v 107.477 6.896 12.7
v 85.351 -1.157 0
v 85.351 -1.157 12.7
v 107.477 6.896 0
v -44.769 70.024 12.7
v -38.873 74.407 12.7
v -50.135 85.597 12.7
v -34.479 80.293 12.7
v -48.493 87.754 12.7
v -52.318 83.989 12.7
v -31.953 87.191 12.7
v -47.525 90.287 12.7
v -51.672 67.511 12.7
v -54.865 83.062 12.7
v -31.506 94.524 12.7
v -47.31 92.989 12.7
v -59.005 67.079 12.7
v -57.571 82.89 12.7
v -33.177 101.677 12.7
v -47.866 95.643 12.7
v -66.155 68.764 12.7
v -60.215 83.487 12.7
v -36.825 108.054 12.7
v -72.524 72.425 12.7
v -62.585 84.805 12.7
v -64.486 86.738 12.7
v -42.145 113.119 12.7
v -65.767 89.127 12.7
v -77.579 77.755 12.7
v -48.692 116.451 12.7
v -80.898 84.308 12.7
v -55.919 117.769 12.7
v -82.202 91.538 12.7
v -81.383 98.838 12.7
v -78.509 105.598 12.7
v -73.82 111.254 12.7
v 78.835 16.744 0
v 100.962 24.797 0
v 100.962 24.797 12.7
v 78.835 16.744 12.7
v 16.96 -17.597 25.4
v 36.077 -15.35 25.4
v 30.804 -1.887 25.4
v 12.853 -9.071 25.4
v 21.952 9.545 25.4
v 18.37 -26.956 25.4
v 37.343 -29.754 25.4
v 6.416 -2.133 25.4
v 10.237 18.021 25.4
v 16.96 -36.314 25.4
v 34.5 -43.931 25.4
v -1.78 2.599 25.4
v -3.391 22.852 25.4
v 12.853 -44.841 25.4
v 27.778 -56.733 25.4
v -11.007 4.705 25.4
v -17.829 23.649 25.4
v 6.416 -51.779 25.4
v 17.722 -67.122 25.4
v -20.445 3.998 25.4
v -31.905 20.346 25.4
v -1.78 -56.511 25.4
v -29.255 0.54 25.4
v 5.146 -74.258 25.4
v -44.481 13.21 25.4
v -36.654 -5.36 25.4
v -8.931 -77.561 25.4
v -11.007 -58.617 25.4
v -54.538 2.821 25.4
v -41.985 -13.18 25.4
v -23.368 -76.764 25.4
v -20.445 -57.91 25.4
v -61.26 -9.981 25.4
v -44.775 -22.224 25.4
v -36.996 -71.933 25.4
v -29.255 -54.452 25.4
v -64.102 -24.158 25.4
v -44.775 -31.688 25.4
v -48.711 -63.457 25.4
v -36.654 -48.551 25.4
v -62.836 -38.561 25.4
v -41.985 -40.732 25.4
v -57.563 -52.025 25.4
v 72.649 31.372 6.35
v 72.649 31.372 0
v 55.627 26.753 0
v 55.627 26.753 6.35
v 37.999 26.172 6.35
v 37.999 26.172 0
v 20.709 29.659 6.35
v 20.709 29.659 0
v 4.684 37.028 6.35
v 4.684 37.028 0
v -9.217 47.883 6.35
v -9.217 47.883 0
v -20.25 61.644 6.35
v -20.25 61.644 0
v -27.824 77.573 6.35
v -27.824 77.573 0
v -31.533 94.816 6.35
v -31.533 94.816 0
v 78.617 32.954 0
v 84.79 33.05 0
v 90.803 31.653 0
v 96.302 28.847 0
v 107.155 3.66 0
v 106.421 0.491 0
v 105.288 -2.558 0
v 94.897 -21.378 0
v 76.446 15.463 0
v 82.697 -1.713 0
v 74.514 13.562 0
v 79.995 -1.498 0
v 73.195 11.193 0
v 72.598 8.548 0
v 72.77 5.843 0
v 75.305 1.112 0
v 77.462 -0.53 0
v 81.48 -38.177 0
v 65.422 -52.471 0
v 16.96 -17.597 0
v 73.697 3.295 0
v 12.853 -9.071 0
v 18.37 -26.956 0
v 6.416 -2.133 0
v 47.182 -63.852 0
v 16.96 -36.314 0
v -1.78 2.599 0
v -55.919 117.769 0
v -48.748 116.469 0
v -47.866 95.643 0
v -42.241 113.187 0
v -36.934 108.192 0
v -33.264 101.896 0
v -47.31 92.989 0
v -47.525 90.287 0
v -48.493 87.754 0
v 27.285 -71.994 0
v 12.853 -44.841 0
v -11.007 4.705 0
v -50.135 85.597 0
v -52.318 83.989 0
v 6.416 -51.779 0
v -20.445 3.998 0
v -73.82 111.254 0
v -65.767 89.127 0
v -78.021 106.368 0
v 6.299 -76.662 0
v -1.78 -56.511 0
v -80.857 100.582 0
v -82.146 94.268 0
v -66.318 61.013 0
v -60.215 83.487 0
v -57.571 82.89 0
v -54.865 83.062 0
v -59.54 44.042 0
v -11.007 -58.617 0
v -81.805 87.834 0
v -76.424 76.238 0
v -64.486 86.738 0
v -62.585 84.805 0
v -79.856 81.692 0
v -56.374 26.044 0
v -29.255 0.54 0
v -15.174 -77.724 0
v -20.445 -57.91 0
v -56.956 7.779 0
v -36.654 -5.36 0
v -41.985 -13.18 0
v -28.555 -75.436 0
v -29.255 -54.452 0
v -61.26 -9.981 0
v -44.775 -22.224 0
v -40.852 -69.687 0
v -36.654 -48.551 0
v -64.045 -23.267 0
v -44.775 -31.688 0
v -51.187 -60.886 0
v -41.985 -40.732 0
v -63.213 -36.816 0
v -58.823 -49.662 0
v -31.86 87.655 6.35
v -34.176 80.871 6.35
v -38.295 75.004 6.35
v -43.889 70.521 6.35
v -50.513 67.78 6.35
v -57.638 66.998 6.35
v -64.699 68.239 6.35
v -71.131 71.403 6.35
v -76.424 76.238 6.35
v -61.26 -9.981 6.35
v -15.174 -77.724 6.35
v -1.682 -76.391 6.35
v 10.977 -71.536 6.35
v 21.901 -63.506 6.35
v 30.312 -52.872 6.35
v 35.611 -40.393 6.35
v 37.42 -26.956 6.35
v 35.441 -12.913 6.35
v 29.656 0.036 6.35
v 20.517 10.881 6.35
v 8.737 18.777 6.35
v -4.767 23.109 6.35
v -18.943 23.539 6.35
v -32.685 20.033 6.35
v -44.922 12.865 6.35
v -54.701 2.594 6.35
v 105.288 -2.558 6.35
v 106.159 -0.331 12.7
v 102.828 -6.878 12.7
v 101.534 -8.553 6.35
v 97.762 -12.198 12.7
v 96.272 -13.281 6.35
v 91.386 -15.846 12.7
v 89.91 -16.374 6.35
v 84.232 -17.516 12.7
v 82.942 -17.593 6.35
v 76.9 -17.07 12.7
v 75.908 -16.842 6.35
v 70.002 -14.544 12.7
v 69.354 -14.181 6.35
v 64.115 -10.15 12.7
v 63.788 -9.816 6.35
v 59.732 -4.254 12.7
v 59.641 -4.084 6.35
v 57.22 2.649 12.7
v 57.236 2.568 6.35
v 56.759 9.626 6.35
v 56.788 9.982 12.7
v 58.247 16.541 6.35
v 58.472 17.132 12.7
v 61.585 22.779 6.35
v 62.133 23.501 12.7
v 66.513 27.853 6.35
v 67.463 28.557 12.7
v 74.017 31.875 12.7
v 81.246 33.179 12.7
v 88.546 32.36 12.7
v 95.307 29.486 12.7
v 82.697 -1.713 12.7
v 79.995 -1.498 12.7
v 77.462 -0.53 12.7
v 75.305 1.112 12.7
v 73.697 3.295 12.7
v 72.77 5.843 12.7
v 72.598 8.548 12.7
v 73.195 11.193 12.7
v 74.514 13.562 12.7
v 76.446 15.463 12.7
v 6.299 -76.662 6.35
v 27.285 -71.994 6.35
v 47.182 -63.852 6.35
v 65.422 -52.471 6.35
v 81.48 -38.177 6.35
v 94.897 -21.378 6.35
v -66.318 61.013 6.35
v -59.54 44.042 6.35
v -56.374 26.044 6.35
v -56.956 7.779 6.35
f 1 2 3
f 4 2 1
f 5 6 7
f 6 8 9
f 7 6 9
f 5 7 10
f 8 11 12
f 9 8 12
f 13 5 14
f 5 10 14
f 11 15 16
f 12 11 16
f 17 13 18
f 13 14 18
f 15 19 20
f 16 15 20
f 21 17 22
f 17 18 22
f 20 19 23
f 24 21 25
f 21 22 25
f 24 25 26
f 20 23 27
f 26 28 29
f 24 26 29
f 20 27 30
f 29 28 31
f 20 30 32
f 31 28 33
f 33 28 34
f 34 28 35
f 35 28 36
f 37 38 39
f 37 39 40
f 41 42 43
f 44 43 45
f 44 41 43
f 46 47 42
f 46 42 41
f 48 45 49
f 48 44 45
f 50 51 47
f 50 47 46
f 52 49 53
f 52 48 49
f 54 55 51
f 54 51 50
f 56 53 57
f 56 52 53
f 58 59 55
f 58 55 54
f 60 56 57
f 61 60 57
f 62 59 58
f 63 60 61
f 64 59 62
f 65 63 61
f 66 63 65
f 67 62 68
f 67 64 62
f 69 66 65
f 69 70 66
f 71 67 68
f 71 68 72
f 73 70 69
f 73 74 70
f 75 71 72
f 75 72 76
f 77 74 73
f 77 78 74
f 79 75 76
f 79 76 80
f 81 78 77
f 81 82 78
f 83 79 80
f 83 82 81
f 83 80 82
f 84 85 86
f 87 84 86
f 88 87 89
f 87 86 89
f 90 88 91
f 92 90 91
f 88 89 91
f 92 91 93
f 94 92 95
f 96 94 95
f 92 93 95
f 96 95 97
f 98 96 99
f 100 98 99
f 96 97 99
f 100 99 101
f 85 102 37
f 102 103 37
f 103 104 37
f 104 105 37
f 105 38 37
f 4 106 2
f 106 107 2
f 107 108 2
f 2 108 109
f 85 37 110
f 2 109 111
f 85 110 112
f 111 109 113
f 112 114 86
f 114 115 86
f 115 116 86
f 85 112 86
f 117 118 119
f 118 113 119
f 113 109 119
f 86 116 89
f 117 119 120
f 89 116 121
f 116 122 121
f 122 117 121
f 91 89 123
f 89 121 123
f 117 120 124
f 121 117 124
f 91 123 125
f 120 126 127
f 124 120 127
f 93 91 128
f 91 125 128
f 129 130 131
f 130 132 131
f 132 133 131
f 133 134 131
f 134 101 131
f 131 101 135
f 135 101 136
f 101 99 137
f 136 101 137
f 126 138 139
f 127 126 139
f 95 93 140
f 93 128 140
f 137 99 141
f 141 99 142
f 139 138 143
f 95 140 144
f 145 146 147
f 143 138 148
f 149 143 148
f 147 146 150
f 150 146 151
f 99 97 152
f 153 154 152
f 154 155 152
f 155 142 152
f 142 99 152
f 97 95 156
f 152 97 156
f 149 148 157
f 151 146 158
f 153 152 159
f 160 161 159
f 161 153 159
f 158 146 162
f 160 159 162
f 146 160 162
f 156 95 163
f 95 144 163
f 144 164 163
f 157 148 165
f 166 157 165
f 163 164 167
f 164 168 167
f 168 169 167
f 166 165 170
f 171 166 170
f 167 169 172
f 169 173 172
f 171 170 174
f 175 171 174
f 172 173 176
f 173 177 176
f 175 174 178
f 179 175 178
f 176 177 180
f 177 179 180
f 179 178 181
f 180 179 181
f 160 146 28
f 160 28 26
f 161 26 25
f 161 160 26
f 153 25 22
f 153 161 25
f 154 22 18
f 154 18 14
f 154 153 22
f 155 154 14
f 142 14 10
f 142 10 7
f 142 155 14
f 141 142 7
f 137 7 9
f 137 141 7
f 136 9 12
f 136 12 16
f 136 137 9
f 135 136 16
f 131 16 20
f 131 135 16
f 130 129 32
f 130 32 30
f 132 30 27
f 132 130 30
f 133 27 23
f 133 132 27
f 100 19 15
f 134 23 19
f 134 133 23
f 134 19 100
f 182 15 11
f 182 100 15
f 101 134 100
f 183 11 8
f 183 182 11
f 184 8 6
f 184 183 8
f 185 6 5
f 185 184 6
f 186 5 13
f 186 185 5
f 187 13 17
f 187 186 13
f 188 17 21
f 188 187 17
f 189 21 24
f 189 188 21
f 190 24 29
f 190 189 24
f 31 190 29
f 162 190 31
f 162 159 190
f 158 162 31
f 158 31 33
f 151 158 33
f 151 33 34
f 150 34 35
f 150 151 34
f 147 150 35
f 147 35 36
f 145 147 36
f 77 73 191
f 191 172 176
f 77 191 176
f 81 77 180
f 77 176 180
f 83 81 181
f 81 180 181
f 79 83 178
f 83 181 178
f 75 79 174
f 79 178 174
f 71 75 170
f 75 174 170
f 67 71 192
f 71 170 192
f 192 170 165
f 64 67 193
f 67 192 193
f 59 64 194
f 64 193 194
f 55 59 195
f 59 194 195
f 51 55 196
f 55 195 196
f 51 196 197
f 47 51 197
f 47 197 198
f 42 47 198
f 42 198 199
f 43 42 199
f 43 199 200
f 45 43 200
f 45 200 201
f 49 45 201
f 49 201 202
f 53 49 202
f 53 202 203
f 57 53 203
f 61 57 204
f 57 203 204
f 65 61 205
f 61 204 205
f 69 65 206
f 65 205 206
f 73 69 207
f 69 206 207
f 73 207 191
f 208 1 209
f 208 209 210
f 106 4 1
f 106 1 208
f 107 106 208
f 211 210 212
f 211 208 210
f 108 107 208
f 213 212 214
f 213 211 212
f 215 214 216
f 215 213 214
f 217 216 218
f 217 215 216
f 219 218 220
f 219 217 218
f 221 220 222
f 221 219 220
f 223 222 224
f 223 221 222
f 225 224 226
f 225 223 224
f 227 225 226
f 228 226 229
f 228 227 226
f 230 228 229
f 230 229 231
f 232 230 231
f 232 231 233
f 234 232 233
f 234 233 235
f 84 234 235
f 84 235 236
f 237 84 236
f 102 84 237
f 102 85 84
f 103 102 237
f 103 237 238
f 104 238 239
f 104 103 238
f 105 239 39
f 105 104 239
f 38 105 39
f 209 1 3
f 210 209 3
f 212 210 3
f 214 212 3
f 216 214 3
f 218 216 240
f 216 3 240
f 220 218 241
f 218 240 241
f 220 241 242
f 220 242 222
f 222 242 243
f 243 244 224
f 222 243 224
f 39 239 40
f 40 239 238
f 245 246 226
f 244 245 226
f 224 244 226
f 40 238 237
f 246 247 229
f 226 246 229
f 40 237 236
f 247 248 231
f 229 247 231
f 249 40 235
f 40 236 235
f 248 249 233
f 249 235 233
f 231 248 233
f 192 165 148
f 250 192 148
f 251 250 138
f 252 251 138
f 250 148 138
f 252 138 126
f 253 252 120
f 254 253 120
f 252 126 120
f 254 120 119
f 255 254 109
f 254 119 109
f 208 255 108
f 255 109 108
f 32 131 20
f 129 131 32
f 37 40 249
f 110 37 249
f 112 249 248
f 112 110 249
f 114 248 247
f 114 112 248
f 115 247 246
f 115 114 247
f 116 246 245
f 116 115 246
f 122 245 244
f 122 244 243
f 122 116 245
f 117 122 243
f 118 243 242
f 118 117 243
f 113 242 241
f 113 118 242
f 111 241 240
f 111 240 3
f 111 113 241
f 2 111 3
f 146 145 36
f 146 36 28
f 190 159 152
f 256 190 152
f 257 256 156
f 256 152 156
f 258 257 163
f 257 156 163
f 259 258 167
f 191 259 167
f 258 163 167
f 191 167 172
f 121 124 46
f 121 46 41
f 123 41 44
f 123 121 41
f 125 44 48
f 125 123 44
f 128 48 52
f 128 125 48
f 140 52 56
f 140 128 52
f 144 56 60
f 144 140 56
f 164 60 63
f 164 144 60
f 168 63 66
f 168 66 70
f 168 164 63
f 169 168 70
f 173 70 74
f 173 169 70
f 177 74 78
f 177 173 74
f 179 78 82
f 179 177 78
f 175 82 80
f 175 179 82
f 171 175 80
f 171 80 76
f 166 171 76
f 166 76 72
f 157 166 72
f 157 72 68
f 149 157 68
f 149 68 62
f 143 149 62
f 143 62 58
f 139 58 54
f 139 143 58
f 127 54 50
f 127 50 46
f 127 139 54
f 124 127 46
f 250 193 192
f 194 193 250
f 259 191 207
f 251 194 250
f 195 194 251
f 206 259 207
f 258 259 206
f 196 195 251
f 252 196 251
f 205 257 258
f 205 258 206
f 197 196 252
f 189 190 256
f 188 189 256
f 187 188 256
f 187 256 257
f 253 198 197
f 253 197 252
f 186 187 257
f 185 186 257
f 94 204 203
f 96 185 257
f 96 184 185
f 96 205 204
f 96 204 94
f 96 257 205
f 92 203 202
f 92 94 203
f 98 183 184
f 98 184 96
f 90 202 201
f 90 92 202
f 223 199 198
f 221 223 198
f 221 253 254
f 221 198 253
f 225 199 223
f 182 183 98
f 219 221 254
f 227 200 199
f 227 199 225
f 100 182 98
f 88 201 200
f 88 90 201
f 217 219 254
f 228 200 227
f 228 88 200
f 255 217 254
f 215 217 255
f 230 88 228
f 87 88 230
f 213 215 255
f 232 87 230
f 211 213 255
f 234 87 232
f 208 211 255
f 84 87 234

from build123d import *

# Parameters (mm, degrees)
BOSS_EXTRUDE1_DEPTH = 6.35
BOSS_EXTRUDE2_DEPTH = 12.7
SKETCH1_4_R         = 31.75
BOSS_EXTRUDE3_DEPTH = 25.4


with BuildPart() as part:
    # Sketch1 → Boss-Extrude1 (new body)
    with BuildSketch(Plane.XY):
        with BuildLine():
            ThreePointArc((72.649235075, 31.372352915), (4.684377865, 37.027544064), (-31.532761281, 94.816140123))
            ThreePointArc((-31.532761281, 94.816140123), (-47.103439421, 68.915388021), (-76.423524765, 76.238472936))
            ThreePointArc((-76.423524765, 76.238472936), (-57.493211559, 35.124721846), (-61.259500498, -9.980847149))
            ThreePointArc((-61.259500498, -9.980847149), (-4.767373791, 23.108705876), (37.42041065, -26.955949752))
            ThreePointArc((37.42041065, -26.955949752), (21.901301878, -63.505897962), (-15.174026915, -77.724246886))
            ThreePointArc((-15.174026915, -77.724246886), (56.54324661, -58.54842731), (105.288459403, -2.557502975))
            ThreePointArc((105.288459403, -2.557502975), (63.787892957, -9.815690456), (72.649235075, 31.372352915))
        make_face()
    extrude(amount=BOSS_EXTRUDE1_DEPTH)

    # Sketch1<3> → Boss-Extrude2 (add)
    with BuildSketch(Plane.XY):
        with BuildLine():
            Line((-55.91892877, 117.769161654), (-47.865575339, 95.642754953))
            ThreePointArc((-47.865575339, 95.642754953), (-53.558405687, 83.434440874), (-65.766719765, 89.127271222))
            Line((-65.766719765, 89.127271222), (-73.820073196, 111.253677924))
            ThreePointArc((-73.820073196, 111.253677924), (-48.128835912, 68.516820519), (-55.91892877, 117.769161654))
        make_face()
        with BuildLine():
            ThreePointArc((100.961845758, 24.797222453), (58.224988354, -0.894014831), (107.477329489, 6.896078027))
            Line((107.477329489, 6.896078027), (85.350922787, -1.157275404))
            ThreePointArc((85.350922787, -1.157275404), (73.142608709, 4.535554944), (78.835439057, 16.743869022))
            Line((78.835439057, 16.743869022), (100.961845758, 24.797222453))
        make_face()
    extrude(amount=BOSS_EXTRUDE2_DEPTH)

    # Sketch1<4> → Boss-Extrude3 (add)
    with BuildSketch(Plane.XY):
        with BuildLine():
            ThreePointArc((37.42041065, -26.955949752), (-4.767373791, 23.108705876), (-61.259500498, -9.980847149))
            ThreePointArc((-61.259500498, -9.980847149), (-55.381699797, -55.529761504), (-15.174026915, -77.724246886))
            ThreePointArc((-15.174026915, -77.724246886), (21.901301878, -63.505897962), (37.42041065, -26.955949752))
        make_face()
        with Locations((-13.37958935, -26.955949752)):
            Circle(SKETCH1_4_R, mode=Mode.SUBTRACT)
    extrude(amount=BOSS_EXTRUDE3_DEPTH)


solid = part.part
